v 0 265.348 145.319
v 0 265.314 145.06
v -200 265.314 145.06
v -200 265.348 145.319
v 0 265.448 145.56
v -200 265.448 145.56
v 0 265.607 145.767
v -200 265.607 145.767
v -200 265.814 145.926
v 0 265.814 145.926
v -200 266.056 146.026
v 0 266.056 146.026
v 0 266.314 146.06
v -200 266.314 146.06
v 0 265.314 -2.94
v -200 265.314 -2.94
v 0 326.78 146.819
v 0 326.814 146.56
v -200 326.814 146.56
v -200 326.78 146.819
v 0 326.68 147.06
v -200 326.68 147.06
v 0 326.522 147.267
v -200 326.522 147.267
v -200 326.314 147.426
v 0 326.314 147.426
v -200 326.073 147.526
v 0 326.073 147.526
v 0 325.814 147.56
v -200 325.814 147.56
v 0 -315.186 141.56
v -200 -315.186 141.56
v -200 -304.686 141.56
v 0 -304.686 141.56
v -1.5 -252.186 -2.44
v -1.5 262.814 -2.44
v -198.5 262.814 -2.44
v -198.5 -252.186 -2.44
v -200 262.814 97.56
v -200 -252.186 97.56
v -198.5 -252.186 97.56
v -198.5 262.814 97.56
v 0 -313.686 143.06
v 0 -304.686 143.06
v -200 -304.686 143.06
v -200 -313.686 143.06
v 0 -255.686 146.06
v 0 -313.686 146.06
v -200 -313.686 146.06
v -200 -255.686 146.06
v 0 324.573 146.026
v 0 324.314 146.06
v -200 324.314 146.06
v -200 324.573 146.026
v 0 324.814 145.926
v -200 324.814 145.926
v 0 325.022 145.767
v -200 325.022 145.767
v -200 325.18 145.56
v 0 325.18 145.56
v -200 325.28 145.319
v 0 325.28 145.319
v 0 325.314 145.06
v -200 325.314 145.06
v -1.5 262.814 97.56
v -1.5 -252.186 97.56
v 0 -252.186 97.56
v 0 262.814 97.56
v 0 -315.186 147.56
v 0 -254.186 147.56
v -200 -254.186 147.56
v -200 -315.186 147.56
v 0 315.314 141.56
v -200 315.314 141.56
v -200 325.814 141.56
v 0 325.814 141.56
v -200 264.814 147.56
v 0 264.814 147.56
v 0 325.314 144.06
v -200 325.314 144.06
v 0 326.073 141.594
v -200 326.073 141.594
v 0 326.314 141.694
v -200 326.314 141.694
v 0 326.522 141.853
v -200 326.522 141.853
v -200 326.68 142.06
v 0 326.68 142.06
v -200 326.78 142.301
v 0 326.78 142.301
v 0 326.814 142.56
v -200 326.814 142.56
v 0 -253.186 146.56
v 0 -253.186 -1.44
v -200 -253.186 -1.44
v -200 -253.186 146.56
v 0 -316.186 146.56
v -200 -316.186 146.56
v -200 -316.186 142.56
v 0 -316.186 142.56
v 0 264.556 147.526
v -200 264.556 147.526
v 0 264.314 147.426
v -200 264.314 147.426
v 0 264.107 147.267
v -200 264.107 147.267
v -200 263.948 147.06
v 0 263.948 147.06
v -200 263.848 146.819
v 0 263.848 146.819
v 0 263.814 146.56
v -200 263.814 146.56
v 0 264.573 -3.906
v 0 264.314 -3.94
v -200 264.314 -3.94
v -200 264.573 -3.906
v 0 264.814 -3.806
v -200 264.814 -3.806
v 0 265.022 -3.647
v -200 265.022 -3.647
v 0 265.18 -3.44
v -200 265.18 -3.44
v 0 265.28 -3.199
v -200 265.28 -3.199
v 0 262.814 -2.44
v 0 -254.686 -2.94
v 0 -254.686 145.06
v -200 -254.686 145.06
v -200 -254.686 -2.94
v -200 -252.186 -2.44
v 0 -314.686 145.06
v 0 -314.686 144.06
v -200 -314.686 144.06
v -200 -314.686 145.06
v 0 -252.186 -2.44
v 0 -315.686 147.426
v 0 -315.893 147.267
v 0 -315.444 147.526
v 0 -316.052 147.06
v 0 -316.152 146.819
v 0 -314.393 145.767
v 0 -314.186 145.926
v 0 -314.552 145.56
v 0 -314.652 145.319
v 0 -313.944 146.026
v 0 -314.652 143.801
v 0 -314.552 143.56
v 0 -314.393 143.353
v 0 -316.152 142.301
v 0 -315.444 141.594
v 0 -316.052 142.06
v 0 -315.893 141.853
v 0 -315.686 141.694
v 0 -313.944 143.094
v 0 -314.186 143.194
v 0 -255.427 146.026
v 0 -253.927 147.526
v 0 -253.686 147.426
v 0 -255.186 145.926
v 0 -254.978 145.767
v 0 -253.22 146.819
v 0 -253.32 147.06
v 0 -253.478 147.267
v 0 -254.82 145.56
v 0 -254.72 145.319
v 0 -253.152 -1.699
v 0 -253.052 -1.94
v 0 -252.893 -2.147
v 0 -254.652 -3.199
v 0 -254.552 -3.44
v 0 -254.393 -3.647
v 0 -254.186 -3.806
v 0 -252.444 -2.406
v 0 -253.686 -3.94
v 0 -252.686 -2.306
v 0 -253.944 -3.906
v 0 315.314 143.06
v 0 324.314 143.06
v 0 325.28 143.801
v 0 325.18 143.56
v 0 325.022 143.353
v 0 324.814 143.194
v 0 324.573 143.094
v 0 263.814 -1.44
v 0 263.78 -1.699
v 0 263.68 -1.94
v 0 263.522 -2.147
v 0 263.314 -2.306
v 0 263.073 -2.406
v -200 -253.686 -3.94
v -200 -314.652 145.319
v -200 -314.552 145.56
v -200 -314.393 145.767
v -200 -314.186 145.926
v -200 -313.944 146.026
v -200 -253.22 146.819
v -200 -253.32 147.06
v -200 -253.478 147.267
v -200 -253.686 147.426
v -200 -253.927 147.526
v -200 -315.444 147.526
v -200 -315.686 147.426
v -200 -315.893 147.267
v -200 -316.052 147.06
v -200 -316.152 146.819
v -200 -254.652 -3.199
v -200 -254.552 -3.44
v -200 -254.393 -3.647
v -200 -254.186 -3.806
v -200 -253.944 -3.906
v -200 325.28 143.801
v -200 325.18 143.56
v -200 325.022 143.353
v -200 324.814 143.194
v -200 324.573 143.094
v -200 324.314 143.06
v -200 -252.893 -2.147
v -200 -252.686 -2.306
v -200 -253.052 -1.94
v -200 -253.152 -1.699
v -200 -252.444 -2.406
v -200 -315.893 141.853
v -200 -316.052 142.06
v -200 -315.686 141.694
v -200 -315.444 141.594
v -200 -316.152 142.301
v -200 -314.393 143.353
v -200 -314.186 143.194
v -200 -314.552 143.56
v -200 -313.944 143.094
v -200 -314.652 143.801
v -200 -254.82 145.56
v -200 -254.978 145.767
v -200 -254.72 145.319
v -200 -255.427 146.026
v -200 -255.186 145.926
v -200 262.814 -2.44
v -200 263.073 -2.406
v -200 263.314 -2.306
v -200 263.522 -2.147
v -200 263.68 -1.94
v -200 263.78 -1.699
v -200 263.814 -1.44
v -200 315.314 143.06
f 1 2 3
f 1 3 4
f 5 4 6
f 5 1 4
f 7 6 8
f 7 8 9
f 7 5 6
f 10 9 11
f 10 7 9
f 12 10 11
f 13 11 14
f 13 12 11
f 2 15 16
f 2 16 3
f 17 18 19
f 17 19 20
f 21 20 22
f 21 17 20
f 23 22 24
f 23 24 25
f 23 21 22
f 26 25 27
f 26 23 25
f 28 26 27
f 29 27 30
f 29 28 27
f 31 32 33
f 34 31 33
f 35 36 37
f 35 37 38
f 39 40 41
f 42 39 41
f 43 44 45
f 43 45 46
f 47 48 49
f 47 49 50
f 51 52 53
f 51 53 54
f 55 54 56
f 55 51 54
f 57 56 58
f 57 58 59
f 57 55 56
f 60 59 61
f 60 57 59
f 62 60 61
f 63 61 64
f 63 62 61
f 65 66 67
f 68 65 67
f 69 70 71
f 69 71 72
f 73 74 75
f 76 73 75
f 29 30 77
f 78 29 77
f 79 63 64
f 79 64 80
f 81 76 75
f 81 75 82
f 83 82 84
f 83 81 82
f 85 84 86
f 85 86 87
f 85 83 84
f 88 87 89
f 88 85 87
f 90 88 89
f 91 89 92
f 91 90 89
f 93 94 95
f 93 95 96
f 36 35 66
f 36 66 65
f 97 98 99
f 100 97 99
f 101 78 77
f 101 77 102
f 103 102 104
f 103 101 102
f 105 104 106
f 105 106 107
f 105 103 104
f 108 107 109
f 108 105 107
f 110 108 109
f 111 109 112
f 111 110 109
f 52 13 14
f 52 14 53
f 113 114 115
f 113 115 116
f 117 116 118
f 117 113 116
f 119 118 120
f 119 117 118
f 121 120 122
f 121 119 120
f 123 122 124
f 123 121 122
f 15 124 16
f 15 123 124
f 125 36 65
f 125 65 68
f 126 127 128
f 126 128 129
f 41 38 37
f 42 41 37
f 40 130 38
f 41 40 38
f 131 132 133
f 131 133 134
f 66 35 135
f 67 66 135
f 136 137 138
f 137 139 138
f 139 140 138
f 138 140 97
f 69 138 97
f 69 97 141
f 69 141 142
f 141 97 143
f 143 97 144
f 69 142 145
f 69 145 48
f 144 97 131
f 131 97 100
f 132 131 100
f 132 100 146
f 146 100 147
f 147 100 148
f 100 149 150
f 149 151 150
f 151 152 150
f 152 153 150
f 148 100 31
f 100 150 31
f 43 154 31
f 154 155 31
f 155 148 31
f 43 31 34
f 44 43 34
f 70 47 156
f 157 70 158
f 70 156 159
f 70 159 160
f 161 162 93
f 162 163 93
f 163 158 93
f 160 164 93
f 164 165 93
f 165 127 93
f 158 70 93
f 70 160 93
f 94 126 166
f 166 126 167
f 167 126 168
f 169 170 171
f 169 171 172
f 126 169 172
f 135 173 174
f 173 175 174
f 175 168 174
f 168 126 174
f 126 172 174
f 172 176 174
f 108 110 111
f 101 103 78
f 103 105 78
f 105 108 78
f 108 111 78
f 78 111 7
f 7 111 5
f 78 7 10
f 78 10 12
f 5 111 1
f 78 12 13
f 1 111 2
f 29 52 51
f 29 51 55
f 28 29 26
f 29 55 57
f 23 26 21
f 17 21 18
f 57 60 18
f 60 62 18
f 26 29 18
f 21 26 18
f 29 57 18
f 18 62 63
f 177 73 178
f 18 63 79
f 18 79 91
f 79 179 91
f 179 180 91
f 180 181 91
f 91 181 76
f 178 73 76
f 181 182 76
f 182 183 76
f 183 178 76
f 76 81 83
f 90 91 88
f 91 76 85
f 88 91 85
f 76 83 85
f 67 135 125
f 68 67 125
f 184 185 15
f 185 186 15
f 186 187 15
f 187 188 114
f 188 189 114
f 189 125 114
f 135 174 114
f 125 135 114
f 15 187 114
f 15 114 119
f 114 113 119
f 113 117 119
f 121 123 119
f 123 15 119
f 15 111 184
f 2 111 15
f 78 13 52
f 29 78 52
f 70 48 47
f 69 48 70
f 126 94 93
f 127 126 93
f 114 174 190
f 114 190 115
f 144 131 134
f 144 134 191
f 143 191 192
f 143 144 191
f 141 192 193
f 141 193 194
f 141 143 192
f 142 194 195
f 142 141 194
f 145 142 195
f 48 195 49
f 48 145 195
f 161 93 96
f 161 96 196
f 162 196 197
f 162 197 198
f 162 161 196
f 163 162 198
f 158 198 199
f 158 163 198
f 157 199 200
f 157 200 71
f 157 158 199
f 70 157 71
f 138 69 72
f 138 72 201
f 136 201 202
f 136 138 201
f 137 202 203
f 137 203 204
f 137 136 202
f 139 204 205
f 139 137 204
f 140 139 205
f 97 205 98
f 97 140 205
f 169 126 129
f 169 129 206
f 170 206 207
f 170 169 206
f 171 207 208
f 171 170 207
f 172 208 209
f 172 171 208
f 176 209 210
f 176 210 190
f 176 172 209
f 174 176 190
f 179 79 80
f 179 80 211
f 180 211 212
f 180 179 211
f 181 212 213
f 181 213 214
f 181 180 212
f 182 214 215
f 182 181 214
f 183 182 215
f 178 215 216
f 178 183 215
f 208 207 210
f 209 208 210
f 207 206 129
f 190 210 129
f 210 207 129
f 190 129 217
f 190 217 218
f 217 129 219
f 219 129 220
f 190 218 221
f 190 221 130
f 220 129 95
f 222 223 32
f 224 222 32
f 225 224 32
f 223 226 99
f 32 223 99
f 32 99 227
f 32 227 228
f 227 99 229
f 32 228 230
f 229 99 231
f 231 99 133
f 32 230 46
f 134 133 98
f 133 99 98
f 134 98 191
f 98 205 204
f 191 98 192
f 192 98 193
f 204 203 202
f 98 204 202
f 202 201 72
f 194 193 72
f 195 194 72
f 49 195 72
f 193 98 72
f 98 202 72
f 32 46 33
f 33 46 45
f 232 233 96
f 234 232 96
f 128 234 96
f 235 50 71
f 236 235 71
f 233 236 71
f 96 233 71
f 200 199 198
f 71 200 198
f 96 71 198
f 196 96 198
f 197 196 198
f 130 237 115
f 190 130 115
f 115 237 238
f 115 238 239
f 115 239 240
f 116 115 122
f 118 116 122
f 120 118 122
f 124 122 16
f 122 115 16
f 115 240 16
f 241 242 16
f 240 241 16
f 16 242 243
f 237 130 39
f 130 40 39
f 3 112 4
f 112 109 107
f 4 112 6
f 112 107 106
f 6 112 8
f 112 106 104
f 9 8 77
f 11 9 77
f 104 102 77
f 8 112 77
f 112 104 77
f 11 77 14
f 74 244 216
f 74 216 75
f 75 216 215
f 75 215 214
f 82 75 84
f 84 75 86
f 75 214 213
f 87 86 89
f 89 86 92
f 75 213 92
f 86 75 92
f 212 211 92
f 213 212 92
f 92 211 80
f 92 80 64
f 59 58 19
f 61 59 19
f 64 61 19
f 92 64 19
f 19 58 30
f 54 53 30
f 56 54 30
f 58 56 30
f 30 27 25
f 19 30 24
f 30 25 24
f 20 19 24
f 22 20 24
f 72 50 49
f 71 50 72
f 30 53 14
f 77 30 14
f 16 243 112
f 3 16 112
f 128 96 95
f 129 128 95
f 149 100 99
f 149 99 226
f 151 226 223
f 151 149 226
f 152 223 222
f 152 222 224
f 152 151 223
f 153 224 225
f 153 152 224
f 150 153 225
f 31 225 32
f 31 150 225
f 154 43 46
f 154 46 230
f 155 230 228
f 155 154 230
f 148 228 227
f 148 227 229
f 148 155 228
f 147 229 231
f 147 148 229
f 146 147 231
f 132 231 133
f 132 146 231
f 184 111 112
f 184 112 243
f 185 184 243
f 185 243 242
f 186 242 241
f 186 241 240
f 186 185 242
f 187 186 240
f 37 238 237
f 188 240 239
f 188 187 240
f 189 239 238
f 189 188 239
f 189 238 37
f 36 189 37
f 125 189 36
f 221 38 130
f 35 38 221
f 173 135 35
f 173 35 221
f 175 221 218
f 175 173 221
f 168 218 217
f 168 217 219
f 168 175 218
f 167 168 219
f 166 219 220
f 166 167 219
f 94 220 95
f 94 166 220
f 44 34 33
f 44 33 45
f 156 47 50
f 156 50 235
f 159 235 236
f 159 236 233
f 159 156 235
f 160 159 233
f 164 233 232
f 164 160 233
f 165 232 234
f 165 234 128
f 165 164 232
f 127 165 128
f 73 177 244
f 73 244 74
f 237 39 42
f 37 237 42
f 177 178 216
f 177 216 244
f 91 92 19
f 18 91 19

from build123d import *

# Parameters (mm, degrees)
F1_DEPTH = 200
F2_W     = 1.5
F2_H     = 515
F3_DEPTH = 100


with BuildPart() as f1:
    # F0 (on Right) → F1 (new body)
    with BuildSketch(Plane.YZ):
        with BuildLine():
            Line((-304.685603, 141.559852), (-304.685603, 143.059852))
            Line((-304.685603, 143.059852), (-313.685603, 143.059852))
            ThreePointArc((-313.685603, 143.059852), (-314.39271, 143.352745), (-314.685603, 144.059852))
            Line((-314.685603, 144.059852), (-314.685603, 145.059852))
            ThreePointArc((-314.685603, 145.059852), (-314.39271, 145.766959), (-313.685603, 146.059852))
            Line((-313.685603, 146.059852), (-255.685603, 146.059852))
            ThreePointArc((-255.685603, 146.059852), (-254.978496, 145.766959), (-254.685603, 145.059852))
            Line((-254.685603, 145.059852), (-254.685603, -2.940148))
            ThreePointArc((-254.685603, -2.940148), (-254.39271, -3.647255), (-253.685603, -3.940148))
            Line((-253.685603, -3.940148), (264.314397, -3.940148))
            ThreePointArc((264.314397, -3.940148), (265.021504, -3.647255), (265.314397, -2.940148))
            Line((265.314397, -2.940148), (265.314397, 145.059852))
            ThreePointArc((265.314397, 145.059852), (265.60729, 145.766959), (266.314397, 146.059852))
            Line((266.314397, 146.059852), (324.314397, 146.059852))
            ThreePointArc((324.314397, 146.059852), (325.021504, 145.766959), (325.314397, 145.059852))
            Line((325.314397, 145.059852), (325.314397, 144.059852))
            ThreePointArc((325.314397, 144.059852), (325.021504, 143.352745), (324.314397, 143.059852))
            Line((324.314397, 143.059852), (315.314397, 143.059852))
            Line((315.314397, 143.059852), (315.314397, 141.559852))
            Line((315.314397, 141.559852), (325.814397, 141.559852))
            ThreePointArc((325.814397, 141.559852), (326.521504, 141.852745), (326.814397, 142.559852))
            Line((326.814397, 142.559852), (326.814397, 146.559852))
            ThreePointArc((326.814397, 146.559852), (326.521504, 147.266959), (325.814397, 147.559852))
            Line((325.814397, 147.559852), (264.814397, 147.559852))
            ThreePointArc((264.814397, 147.559852), (264.10729, 147.266959), (263.814397, 146.559852))
            Line((263.814397, 146.559852), (263.814397, -1.440148))
            ThreePointArc((263.814397, -1.440148), (263.521504, -2.147255), (262.814397, -2.440148))
            Line((262.814397, -2.440148), (-252.185603, -2.440148))
            ThreePointArc((-252.185603, -2.440148), (-252.89271, -2.147255), (-253.185603, -1.440148))
            Line((-253.185603, -1.440148), (-253.185603, 146.559852))
            ThreePointArc((-253.185603, 146.559852), (-253.478496, 147.266959), (-254.185603, 147.559852))
            Line((-254.185603, 147.559852), (-315.185603, 147.559852))
            ThreePointArc((-315.185603, 147.559852), (-315.89271, 147.266959), (-316.185603, 146.559852))
            Line((-316.185603, 146.559852), (-316.185603, 142.559852))
            ThreePointArc((-316.185603, 142.559852), (-315.89271, 141.852745), (-315.185603, 141.559852))
            Line((-315.185603, 141.559852), (-304.685603, 141.559852))
        make_face()
    extrude(amount=-F1_DEPTH)

    # F2 (on face) → F3 (join)
    with BuildSketch(Plane.XY.offset(-2.440148)):
        with Locations((-0.75, 5.314397)):
            Rectangle(F2_W, F2_H)
        with Locations((-199.25, 5.314397)):
            Rectangle(F2_W, F2_H)
    extrude(amount=F3_DEPTH)


solid = f1.part
